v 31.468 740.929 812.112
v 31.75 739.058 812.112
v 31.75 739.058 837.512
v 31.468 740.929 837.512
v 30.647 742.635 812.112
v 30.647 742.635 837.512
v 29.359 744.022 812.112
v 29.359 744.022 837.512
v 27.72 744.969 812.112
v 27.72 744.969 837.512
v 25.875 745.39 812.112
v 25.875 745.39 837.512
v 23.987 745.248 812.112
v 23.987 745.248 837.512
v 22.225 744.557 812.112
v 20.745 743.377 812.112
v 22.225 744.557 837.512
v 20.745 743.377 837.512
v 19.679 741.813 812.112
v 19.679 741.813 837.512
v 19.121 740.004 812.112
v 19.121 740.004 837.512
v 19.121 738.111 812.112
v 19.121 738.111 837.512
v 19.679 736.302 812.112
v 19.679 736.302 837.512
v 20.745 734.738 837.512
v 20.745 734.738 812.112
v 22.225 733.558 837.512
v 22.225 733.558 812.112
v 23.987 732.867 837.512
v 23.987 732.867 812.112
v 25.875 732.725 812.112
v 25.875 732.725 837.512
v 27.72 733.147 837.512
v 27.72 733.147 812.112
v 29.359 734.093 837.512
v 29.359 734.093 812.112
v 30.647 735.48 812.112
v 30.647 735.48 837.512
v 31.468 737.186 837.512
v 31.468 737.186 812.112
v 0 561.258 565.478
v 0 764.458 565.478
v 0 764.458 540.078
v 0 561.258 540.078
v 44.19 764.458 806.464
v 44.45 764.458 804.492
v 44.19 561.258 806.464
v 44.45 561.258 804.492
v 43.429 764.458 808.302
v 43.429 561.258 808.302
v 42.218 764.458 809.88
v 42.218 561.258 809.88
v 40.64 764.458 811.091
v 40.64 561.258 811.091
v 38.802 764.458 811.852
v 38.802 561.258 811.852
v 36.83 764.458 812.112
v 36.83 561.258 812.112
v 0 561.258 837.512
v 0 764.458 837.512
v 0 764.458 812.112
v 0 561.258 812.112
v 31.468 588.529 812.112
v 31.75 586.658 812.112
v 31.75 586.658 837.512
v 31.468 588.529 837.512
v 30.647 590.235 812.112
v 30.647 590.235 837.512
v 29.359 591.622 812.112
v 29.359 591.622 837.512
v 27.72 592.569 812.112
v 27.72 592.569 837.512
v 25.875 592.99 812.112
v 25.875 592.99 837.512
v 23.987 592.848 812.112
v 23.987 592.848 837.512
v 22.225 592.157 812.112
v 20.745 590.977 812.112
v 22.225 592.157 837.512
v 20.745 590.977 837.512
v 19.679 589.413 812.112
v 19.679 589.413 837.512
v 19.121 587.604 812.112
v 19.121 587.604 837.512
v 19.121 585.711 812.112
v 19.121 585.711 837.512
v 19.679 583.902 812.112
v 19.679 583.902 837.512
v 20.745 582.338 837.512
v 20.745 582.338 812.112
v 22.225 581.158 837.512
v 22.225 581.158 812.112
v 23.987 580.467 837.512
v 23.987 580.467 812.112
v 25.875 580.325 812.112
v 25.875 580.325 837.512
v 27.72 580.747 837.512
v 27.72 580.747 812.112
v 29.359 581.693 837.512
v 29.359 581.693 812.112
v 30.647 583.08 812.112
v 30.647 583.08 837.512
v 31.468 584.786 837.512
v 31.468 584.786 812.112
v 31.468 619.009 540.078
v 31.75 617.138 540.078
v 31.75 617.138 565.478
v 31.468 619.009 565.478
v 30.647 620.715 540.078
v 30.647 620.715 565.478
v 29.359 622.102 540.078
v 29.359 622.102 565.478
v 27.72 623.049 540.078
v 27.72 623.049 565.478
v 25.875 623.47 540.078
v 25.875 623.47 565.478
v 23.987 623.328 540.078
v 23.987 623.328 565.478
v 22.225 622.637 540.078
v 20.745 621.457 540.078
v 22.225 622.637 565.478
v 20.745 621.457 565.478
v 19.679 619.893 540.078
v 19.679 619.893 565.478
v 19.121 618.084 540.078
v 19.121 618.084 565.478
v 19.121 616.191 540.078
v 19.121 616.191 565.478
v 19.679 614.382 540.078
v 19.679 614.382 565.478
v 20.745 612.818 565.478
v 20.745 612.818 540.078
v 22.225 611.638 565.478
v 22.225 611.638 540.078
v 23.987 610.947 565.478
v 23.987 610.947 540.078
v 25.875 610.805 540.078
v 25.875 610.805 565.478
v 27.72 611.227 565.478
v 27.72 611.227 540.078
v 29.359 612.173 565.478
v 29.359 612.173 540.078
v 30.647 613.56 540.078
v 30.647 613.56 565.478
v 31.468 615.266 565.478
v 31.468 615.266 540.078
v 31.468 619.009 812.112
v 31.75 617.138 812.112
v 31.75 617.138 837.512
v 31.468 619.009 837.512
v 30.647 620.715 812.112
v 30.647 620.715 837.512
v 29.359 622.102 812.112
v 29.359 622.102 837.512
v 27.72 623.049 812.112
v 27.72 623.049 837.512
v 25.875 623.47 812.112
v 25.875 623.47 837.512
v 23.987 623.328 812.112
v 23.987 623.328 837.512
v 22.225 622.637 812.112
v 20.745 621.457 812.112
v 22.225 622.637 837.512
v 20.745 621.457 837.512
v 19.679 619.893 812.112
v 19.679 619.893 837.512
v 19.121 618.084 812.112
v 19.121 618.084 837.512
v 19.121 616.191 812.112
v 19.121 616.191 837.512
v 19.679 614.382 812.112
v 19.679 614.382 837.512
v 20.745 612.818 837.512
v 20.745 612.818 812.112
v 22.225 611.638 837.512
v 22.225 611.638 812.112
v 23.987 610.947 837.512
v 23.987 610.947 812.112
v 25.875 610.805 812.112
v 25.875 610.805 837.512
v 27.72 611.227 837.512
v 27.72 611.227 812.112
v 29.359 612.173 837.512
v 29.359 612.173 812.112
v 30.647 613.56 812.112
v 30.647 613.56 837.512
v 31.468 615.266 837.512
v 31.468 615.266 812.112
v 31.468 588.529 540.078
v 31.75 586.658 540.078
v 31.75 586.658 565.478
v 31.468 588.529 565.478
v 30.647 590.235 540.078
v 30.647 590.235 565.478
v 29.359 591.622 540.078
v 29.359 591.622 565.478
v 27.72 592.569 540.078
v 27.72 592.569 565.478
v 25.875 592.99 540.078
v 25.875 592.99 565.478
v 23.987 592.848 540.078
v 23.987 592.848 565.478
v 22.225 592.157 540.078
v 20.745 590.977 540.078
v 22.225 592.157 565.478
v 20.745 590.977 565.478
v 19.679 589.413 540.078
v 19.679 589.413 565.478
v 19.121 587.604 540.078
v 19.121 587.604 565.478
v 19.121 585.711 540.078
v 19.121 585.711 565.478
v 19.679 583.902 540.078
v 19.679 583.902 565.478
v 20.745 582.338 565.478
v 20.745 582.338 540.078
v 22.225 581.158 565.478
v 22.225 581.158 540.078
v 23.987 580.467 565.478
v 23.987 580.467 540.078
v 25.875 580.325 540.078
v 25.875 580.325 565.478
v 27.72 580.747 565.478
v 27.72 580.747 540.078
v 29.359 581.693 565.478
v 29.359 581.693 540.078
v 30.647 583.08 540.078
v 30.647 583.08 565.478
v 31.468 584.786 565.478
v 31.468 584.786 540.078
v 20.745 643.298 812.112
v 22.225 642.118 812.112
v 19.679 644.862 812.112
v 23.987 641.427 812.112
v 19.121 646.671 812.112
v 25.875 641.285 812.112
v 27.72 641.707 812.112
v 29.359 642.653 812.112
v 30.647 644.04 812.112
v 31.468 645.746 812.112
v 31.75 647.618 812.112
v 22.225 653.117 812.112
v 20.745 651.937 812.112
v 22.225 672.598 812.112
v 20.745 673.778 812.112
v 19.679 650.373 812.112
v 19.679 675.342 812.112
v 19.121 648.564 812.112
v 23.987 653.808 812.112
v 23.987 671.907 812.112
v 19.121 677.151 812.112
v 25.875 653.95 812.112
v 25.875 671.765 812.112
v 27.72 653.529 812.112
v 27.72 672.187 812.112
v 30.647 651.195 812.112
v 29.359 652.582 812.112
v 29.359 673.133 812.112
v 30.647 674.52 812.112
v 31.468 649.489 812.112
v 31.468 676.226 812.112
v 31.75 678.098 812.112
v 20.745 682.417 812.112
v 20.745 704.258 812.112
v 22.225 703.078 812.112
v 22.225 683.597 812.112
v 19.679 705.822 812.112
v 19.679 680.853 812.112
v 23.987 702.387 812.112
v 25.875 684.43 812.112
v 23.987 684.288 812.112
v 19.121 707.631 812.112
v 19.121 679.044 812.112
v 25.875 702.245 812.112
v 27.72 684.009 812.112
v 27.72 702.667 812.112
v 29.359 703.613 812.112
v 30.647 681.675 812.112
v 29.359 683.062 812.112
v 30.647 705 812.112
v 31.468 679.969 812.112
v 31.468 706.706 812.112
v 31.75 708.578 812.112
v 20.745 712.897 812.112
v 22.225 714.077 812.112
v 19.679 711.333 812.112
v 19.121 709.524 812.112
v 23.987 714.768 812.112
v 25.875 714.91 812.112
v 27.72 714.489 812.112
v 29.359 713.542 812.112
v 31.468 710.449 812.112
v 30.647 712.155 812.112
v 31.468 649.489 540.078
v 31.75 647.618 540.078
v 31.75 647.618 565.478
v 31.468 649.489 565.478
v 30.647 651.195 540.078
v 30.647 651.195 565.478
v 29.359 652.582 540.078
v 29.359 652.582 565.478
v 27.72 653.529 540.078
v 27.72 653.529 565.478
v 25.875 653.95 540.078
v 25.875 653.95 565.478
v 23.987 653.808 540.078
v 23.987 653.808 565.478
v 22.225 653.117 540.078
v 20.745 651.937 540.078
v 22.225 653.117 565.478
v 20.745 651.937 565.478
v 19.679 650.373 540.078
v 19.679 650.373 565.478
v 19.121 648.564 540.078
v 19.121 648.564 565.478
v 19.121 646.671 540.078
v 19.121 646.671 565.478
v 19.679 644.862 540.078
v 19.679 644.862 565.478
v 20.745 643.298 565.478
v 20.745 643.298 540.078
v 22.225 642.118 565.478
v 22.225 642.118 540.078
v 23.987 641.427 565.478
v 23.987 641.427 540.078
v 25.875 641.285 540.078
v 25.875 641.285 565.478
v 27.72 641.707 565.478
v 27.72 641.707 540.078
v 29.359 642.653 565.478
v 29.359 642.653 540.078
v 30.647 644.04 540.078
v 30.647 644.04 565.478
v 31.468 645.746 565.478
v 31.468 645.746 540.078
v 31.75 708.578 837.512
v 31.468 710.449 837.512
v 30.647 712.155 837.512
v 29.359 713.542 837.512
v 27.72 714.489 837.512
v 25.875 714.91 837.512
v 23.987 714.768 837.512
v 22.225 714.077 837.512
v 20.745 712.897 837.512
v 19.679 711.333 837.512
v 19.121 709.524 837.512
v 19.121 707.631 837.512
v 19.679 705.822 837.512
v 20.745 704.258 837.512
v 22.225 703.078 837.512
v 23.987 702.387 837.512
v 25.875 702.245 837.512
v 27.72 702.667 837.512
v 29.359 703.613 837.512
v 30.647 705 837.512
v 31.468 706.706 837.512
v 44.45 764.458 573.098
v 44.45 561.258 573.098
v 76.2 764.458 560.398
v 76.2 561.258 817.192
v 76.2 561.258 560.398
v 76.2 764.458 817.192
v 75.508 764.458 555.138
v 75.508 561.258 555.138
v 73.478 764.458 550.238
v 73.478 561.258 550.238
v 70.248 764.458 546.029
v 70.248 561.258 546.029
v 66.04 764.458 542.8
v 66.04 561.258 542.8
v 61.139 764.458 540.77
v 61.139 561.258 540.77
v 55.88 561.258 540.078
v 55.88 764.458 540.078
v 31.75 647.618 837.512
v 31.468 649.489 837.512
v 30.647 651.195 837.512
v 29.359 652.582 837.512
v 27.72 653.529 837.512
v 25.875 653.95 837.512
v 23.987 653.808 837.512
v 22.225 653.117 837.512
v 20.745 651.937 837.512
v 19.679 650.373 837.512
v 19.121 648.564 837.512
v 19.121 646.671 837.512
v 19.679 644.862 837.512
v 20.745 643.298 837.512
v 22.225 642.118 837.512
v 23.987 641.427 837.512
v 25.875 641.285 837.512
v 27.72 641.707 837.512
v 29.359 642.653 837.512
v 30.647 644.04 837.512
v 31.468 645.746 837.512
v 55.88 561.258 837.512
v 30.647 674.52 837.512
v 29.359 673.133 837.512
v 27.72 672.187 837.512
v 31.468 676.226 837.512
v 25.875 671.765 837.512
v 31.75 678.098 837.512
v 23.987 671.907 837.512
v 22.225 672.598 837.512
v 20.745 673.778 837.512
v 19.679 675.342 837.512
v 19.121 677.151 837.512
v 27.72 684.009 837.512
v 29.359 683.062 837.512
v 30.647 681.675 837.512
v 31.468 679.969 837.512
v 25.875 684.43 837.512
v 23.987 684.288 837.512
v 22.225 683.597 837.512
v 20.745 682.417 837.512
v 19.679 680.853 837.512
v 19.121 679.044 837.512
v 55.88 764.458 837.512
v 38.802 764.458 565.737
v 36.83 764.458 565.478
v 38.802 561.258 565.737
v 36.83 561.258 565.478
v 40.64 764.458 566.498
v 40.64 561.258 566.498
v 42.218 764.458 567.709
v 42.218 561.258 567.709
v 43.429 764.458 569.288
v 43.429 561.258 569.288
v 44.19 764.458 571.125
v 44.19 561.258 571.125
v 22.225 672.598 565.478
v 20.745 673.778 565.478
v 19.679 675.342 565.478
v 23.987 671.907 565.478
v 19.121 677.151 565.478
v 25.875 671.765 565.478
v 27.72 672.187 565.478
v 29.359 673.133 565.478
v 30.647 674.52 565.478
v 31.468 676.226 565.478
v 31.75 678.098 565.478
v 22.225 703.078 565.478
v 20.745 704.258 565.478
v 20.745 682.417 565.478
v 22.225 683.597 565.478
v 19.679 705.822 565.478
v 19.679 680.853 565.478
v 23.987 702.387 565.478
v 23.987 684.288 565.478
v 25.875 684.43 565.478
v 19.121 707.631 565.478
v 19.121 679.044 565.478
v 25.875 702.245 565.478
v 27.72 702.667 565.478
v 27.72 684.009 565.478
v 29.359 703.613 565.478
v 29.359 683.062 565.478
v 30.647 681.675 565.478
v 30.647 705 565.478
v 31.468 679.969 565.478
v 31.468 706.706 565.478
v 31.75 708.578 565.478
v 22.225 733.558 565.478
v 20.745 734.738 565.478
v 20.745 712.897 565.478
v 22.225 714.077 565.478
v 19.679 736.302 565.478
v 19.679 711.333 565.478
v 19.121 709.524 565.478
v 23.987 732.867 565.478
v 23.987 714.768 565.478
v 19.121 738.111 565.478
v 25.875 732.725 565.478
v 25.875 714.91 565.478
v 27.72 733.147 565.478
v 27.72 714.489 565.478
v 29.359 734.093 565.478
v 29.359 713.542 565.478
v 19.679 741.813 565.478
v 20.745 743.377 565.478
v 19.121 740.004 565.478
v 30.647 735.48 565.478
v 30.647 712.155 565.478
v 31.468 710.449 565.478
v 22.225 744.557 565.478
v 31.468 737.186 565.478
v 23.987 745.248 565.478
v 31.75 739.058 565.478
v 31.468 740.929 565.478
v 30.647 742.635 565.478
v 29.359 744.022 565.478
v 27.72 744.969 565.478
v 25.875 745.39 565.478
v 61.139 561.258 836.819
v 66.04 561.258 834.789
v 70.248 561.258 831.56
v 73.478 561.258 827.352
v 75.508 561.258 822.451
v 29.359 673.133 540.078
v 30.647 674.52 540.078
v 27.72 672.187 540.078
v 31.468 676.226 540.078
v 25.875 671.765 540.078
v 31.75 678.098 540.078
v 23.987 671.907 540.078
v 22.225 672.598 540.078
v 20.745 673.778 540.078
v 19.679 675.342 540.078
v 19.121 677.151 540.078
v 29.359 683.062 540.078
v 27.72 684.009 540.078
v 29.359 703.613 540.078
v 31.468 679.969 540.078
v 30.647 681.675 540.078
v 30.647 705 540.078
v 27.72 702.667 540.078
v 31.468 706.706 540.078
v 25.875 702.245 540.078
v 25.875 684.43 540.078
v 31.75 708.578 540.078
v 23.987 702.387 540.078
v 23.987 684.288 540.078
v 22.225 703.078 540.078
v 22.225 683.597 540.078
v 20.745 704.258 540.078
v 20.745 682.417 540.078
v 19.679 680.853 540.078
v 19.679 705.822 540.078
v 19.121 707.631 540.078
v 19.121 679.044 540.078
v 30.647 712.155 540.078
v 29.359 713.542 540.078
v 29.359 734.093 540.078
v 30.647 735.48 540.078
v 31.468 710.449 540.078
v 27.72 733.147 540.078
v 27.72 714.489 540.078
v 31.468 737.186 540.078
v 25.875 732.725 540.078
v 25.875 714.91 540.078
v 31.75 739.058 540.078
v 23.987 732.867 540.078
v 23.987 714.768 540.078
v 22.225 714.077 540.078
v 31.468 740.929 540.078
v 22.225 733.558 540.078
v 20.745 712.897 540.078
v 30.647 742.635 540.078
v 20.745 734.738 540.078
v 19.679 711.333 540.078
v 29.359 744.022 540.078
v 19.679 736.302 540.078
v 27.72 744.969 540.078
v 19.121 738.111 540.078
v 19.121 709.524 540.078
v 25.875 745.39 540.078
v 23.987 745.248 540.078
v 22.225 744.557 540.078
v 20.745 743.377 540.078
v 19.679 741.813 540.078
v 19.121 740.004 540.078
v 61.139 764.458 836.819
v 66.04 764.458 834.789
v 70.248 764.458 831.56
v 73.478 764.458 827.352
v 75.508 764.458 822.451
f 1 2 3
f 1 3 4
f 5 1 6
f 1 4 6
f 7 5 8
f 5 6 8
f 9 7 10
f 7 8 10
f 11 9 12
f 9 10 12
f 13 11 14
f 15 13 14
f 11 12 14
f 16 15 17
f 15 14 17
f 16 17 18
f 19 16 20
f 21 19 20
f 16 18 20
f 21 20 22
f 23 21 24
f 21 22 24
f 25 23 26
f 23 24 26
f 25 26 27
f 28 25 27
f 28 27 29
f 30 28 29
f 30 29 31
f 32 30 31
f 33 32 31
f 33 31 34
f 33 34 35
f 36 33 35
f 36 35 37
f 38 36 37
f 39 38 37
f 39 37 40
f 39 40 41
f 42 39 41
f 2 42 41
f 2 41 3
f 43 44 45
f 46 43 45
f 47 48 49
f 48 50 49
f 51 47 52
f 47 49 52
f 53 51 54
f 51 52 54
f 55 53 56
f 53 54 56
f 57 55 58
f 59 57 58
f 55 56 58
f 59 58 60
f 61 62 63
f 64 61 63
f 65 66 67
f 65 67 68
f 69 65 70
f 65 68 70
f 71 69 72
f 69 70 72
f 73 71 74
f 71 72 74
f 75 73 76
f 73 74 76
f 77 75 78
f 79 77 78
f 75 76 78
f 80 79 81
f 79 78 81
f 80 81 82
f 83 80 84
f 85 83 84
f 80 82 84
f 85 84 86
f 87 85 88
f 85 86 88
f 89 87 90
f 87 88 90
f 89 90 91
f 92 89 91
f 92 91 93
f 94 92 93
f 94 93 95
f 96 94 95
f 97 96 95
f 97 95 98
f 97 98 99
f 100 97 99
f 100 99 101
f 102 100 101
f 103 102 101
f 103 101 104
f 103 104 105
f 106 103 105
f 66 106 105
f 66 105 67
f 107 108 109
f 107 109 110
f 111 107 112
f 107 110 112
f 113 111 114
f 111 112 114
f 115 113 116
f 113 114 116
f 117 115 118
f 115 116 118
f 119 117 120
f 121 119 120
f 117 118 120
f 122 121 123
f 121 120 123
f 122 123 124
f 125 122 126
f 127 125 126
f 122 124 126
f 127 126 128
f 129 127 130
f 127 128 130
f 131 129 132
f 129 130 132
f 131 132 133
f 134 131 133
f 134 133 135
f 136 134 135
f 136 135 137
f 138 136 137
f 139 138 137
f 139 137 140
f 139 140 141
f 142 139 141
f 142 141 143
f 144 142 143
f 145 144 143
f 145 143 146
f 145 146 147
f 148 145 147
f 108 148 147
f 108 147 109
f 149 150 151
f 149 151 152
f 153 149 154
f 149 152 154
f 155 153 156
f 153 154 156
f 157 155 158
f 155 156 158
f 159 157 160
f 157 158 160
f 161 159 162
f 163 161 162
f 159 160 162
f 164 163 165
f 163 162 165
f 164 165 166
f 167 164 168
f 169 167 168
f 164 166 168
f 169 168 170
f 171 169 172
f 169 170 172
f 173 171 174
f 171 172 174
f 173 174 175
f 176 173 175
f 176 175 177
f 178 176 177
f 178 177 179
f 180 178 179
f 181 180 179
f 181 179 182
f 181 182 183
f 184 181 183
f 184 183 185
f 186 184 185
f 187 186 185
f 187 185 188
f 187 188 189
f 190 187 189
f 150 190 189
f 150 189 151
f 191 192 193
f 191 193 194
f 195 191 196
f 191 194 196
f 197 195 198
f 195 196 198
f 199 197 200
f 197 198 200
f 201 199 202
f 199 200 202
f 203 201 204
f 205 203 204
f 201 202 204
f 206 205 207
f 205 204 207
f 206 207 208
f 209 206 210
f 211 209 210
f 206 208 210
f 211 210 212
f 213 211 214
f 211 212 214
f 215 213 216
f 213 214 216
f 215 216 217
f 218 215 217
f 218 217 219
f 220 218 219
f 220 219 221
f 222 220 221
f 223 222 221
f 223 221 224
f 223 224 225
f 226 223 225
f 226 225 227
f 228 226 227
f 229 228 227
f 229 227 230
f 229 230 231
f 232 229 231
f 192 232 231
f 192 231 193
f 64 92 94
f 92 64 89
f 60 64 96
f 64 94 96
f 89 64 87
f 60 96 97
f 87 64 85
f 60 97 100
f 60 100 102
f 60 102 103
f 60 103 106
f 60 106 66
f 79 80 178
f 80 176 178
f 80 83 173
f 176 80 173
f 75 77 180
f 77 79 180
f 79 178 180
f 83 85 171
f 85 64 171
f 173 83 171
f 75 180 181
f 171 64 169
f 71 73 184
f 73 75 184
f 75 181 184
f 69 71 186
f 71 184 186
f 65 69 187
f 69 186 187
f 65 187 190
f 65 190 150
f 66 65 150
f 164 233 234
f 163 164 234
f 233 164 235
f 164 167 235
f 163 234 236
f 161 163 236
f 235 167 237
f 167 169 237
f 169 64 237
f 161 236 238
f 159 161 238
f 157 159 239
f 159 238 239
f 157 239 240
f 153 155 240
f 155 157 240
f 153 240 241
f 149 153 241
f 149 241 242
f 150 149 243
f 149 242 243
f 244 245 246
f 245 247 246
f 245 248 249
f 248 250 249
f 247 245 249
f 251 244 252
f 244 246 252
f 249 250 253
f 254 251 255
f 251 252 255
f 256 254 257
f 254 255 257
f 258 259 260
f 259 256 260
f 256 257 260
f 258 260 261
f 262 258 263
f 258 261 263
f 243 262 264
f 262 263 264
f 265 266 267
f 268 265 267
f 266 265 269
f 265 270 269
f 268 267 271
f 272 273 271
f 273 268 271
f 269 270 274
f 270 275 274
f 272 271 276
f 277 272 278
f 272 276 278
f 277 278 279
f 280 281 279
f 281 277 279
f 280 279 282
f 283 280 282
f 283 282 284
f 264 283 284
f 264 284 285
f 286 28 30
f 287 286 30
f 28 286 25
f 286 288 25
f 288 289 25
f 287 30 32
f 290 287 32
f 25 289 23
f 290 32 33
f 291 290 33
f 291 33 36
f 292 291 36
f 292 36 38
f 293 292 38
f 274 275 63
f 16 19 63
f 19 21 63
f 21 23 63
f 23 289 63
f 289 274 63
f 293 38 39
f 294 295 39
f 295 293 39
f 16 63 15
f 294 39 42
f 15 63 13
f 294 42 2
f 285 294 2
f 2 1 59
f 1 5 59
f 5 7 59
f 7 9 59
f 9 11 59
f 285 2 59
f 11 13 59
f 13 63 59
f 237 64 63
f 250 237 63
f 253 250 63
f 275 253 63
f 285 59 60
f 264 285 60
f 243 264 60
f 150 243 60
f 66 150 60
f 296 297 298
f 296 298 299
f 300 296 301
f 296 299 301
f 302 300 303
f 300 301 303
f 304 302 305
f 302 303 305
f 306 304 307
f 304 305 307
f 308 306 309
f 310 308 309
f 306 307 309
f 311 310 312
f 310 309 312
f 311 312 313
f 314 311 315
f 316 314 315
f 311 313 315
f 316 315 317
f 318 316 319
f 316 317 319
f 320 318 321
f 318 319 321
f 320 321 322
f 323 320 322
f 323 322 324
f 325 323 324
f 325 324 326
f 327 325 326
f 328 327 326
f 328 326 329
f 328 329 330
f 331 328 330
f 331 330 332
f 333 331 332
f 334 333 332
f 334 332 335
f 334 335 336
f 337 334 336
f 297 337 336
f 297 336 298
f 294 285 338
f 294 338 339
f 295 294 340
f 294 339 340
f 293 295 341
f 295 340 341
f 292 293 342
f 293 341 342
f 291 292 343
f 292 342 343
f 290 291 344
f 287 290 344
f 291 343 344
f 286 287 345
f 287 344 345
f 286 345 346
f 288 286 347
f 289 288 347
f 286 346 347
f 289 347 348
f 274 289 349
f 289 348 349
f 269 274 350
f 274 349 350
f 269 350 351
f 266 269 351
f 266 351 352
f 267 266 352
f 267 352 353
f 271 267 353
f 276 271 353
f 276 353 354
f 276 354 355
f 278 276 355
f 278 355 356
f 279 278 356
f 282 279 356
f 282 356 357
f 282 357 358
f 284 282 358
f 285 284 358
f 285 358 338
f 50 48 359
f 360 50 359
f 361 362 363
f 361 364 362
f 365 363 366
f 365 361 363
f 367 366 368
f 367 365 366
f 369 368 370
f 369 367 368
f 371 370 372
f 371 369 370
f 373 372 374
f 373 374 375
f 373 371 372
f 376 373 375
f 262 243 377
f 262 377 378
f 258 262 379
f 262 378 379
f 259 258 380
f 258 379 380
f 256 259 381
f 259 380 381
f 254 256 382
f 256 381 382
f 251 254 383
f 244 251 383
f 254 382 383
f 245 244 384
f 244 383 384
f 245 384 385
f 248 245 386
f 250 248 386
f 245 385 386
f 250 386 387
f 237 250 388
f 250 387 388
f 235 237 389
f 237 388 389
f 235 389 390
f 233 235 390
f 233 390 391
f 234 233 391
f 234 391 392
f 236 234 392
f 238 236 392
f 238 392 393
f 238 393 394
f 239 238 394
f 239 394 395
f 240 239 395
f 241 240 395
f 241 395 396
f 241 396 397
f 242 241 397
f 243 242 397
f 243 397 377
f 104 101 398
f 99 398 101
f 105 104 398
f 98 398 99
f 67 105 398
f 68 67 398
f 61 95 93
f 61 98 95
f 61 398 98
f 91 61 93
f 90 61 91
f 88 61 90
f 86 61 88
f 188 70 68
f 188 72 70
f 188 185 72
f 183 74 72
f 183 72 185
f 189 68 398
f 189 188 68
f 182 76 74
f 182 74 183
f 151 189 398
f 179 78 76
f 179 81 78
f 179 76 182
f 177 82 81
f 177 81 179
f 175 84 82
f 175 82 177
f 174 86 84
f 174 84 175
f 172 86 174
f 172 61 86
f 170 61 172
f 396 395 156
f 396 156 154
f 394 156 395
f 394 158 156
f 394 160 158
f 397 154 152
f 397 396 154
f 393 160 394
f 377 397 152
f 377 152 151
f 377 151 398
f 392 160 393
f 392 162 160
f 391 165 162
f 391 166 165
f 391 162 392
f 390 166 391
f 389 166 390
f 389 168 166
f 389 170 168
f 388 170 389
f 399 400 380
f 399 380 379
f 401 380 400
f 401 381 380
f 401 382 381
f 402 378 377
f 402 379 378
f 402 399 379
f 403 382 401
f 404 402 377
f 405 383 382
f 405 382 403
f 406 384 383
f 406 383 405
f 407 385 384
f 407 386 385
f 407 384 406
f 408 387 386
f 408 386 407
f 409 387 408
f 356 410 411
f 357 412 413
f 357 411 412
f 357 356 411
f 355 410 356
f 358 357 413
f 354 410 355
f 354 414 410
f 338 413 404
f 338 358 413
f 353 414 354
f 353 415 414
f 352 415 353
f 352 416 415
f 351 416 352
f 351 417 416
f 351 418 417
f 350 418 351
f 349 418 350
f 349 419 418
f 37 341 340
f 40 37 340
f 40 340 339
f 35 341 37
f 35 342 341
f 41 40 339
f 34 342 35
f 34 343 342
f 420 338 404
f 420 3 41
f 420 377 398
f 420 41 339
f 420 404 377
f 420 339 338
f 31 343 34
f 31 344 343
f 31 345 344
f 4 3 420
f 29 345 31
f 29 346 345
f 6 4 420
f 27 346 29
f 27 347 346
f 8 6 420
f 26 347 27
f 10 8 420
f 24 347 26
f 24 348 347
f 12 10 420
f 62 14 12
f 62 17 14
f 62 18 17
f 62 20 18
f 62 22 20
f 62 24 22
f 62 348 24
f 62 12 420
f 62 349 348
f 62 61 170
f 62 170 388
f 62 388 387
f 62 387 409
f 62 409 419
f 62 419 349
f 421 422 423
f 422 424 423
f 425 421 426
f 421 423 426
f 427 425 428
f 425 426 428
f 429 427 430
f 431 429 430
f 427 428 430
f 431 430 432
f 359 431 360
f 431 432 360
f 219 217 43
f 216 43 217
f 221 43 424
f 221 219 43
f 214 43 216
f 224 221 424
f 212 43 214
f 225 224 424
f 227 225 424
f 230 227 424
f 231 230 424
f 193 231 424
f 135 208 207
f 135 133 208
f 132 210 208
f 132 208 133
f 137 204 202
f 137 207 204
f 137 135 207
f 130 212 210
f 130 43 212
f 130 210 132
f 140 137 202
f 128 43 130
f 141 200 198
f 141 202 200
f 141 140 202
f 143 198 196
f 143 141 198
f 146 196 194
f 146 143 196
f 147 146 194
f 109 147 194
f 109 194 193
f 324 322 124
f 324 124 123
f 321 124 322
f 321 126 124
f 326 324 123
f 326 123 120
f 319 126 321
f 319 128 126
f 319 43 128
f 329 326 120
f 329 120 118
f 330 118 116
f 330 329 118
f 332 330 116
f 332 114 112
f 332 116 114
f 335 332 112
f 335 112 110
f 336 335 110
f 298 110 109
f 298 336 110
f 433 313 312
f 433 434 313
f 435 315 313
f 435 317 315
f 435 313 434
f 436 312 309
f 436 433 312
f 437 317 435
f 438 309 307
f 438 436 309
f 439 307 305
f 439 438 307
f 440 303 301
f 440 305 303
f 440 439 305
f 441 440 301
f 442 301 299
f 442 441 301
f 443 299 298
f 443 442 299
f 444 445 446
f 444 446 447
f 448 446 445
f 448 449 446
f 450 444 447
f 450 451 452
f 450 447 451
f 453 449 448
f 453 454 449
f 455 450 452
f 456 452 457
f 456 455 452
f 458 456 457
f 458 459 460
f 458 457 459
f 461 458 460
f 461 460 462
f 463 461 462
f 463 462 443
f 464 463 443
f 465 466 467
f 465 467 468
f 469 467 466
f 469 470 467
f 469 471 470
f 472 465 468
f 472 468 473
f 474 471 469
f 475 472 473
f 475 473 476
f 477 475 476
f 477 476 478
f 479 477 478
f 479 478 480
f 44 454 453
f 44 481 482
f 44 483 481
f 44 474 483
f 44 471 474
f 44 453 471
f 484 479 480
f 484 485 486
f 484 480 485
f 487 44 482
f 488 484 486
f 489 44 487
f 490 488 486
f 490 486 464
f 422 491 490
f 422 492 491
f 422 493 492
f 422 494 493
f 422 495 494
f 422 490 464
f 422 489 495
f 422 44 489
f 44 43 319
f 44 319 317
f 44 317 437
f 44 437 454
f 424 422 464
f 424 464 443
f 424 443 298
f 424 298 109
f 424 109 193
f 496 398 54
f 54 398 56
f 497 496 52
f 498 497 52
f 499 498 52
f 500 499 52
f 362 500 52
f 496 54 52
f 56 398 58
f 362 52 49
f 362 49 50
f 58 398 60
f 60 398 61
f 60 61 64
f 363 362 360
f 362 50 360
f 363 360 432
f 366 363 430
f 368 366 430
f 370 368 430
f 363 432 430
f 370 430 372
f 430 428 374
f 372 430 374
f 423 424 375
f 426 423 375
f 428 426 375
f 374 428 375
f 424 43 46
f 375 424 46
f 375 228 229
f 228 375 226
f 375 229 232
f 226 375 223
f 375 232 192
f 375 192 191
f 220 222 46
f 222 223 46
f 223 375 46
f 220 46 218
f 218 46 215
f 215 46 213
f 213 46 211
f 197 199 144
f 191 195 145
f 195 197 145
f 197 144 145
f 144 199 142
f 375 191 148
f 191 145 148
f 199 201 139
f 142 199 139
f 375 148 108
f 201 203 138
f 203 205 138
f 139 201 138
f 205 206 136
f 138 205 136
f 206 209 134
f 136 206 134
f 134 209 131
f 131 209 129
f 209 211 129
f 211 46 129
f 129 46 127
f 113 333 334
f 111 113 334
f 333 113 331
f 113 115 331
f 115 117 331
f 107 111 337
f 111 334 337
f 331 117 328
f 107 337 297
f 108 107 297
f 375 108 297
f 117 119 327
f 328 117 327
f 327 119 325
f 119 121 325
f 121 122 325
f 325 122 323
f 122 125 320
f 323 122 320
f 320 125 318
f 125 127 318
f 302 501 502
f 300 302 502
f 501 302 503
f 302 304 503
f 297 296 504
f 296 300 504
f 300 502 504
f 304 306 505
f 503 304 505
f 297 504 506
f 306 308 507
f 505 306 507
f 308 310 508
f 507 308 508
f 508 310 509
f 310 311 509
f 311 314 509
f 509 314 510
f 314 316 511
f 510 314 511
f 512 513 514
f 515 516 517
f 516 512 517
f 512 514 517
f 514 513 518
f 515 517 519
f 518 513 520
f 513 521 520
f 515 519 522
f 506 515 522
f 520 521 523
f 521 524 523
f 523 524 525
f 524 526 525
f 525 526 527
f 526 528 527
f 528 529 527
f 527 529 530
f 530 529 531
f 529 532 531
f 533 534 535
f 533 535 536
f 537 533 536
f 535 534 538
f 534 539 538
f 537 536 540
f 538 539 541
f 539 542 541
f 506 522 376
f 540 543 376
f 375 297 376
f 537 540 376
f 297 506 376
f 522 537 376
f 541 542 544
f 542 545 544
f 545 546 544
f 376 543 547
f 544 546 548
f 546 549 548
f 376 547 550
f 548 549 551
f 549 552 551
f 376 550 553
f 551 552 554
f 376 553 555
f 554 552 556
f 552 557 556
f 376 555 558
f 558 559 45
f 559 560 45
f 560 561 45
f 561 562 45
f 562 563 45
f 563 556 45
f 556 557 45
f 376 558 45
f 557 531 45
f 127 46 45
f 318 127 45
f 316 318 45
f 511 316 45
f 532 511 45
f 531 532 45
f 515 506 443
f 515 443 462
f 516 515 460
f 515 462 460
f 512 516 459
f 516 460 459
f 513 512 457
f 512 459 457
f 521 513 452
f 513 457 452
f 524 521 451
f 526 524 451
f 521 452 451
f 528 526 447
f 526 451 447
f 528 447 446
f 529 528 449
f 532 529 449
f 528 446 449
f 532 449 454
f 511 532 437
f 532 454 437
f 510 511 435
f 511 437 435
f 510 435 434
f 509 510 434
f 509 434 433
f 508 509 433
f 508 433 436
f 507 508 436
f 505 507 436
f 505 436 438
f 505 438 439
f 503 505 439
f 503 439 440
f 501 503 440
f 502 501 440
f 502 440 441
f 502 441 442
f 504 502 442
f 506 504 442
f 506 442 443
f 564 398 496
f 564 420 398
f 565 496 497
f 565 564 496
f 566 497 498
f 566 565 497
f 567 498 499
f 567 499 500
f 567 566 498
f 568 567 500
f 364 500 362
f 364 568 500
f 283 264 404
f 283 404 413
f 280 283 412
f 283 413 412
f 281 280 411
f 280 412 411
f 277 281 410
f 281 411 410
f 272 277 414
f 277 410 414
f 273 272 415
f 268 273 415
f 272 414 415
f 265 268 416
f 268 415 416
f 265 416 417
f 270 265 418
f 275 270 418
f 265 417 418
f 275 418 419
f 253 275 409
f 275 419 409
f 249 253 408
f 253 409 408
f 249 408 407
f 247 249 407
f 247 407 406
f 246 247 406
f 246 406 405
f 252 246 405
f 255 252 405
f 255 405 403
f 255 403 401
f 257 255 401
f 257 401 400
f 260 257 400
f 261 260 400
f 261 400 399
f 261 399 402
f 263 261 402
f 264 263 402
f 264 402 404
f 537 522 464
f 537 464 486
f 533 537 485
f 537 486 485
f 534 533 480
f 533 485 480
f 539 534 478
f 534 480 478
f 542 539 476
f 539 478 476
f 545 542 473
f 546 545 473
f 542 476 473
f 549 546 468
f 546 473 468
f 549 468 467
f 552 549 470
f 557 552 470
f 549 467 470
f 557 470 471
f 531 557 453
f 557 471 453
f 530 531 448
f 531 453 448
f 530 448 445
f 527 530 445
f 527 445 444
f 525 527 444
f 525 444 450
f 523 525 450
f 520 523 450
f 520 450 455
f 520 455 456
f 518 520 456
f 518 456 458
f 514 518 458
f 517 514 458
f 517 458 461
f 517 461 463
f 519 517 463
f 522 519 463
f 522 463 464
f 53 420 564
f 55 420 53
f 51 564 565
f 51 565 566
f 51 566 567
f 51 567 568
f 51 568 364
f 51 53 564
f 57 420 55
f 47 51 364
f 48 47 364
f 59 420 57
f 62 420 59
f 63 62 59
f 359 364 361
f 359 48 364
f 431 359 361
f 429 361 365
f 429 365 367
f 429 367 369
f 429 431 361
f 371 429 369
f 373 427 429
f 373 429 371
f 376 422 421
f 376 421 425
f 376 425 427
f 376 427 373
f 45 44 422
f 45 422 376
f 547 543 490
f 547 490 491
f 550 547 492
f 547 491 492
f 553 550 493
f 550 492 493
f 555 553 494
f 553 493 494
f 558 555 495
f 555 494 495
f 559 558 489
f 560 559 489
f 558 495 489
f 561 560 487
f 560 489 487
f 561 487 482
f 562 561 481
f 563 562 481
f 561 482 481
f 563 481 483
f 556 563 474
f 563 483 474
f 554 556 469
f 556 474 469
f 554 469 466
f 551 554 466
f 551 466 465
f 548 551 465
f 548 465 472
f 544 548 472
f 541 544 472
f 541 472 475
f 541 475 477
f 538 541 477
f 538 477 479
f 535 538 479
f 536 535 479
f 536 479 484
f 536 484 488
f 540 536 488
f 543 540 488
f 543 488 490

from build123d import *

# Parameters (mm, degrees)
SKETCH1_W           = 297.434
SKETCH1_H           = 203.2
BOSS_EXTRUDE1_DEPTH = 76.2
SKETCH3_W           = 44.45
SKETCH3_H           = 246.634
CUT_EXTRUDE1_DEPTH  = 204.2
SKETCH4_R           = 6.35
CUT_EXTRUDE2_DEPTH  = 298.434
FILLET1_R           = 20.32
FILLET2_R           = 7.62


with BuildPart() as part:
    # Sketch1 → Boss-Extrude1 (new body)
    with BuildSketch(Plane(origin=(0, 0, 0), x_dir=(0, 0, -1), z_dir=(1, 0, 0))):
        with Locations((-688.794526316, 662.857561404)):
            Rectangle(SKETCH1_W, SKETCH1_H)
    extrude(amount=BOSS_EXTRUDE1_DEPTH)

    # Sketch3 → Cut-Extrude1 (cut, through all)
    with BuildSketch(Plane(origin=(0, 764.457561404, 0), x_dir=(1, 0, 0), z_dir=(0, 1, 0))):
        with Locations((22.225, -688.794526316)):
            Rectangle(SKETCH3_W, SKETCH3_H)
    extrude(amount=-CUT_EXTRUDE1_DEPTH, mode=Mode.SUBTRACT)

    # Sketch4 → Cut-Extrude2 (cut, through all)
    with BuildSketch(Plane.XY.offset(837.511526316)):
        with Locations((25.4, 739.057561404)):
            Circle(SKETCH4_R)
        with Locations((25.4, 708.577561404)):
            Circle(SKETCH4_R)
        with Locations((25.4, 678.097561404)):
            Circle(SKETCH4_R)
        with Locations((25.4, 647.617561404)):
            Circle(SKETCH4_R)
        with Locations((25.4, 617.137561404)):
            Circle(SKETCH4_R)
        with Locations((25.4, 586.657561404)):
            Circle(SKETCH4_R)
    extrude(amount=-CUT_EXTRUDE2_DEPTH, mode=Mode.SUBTRACT)

    # Fillet1
    fillet1_edges = [part.edges().sort_by_distance(p)[0] for p in [
        (76.2, 662.857561404, 540.077526316),
        (76.2, 662.857561404, 837.511526316),
    ]]
    fillet(fillet1_edges, radius=FILLET1_R)

    # Fillet2
    fillet2_edges = [part.edges().sort_by_distance(p)[0] for p in [
        (44.45, 662.857561404, 565.477526316),
        (44.45, 662.857561404, 812.111526316),
    ]]
    fillet(fillet2_edges, radius=FILLET2_R)


solid = part.part
